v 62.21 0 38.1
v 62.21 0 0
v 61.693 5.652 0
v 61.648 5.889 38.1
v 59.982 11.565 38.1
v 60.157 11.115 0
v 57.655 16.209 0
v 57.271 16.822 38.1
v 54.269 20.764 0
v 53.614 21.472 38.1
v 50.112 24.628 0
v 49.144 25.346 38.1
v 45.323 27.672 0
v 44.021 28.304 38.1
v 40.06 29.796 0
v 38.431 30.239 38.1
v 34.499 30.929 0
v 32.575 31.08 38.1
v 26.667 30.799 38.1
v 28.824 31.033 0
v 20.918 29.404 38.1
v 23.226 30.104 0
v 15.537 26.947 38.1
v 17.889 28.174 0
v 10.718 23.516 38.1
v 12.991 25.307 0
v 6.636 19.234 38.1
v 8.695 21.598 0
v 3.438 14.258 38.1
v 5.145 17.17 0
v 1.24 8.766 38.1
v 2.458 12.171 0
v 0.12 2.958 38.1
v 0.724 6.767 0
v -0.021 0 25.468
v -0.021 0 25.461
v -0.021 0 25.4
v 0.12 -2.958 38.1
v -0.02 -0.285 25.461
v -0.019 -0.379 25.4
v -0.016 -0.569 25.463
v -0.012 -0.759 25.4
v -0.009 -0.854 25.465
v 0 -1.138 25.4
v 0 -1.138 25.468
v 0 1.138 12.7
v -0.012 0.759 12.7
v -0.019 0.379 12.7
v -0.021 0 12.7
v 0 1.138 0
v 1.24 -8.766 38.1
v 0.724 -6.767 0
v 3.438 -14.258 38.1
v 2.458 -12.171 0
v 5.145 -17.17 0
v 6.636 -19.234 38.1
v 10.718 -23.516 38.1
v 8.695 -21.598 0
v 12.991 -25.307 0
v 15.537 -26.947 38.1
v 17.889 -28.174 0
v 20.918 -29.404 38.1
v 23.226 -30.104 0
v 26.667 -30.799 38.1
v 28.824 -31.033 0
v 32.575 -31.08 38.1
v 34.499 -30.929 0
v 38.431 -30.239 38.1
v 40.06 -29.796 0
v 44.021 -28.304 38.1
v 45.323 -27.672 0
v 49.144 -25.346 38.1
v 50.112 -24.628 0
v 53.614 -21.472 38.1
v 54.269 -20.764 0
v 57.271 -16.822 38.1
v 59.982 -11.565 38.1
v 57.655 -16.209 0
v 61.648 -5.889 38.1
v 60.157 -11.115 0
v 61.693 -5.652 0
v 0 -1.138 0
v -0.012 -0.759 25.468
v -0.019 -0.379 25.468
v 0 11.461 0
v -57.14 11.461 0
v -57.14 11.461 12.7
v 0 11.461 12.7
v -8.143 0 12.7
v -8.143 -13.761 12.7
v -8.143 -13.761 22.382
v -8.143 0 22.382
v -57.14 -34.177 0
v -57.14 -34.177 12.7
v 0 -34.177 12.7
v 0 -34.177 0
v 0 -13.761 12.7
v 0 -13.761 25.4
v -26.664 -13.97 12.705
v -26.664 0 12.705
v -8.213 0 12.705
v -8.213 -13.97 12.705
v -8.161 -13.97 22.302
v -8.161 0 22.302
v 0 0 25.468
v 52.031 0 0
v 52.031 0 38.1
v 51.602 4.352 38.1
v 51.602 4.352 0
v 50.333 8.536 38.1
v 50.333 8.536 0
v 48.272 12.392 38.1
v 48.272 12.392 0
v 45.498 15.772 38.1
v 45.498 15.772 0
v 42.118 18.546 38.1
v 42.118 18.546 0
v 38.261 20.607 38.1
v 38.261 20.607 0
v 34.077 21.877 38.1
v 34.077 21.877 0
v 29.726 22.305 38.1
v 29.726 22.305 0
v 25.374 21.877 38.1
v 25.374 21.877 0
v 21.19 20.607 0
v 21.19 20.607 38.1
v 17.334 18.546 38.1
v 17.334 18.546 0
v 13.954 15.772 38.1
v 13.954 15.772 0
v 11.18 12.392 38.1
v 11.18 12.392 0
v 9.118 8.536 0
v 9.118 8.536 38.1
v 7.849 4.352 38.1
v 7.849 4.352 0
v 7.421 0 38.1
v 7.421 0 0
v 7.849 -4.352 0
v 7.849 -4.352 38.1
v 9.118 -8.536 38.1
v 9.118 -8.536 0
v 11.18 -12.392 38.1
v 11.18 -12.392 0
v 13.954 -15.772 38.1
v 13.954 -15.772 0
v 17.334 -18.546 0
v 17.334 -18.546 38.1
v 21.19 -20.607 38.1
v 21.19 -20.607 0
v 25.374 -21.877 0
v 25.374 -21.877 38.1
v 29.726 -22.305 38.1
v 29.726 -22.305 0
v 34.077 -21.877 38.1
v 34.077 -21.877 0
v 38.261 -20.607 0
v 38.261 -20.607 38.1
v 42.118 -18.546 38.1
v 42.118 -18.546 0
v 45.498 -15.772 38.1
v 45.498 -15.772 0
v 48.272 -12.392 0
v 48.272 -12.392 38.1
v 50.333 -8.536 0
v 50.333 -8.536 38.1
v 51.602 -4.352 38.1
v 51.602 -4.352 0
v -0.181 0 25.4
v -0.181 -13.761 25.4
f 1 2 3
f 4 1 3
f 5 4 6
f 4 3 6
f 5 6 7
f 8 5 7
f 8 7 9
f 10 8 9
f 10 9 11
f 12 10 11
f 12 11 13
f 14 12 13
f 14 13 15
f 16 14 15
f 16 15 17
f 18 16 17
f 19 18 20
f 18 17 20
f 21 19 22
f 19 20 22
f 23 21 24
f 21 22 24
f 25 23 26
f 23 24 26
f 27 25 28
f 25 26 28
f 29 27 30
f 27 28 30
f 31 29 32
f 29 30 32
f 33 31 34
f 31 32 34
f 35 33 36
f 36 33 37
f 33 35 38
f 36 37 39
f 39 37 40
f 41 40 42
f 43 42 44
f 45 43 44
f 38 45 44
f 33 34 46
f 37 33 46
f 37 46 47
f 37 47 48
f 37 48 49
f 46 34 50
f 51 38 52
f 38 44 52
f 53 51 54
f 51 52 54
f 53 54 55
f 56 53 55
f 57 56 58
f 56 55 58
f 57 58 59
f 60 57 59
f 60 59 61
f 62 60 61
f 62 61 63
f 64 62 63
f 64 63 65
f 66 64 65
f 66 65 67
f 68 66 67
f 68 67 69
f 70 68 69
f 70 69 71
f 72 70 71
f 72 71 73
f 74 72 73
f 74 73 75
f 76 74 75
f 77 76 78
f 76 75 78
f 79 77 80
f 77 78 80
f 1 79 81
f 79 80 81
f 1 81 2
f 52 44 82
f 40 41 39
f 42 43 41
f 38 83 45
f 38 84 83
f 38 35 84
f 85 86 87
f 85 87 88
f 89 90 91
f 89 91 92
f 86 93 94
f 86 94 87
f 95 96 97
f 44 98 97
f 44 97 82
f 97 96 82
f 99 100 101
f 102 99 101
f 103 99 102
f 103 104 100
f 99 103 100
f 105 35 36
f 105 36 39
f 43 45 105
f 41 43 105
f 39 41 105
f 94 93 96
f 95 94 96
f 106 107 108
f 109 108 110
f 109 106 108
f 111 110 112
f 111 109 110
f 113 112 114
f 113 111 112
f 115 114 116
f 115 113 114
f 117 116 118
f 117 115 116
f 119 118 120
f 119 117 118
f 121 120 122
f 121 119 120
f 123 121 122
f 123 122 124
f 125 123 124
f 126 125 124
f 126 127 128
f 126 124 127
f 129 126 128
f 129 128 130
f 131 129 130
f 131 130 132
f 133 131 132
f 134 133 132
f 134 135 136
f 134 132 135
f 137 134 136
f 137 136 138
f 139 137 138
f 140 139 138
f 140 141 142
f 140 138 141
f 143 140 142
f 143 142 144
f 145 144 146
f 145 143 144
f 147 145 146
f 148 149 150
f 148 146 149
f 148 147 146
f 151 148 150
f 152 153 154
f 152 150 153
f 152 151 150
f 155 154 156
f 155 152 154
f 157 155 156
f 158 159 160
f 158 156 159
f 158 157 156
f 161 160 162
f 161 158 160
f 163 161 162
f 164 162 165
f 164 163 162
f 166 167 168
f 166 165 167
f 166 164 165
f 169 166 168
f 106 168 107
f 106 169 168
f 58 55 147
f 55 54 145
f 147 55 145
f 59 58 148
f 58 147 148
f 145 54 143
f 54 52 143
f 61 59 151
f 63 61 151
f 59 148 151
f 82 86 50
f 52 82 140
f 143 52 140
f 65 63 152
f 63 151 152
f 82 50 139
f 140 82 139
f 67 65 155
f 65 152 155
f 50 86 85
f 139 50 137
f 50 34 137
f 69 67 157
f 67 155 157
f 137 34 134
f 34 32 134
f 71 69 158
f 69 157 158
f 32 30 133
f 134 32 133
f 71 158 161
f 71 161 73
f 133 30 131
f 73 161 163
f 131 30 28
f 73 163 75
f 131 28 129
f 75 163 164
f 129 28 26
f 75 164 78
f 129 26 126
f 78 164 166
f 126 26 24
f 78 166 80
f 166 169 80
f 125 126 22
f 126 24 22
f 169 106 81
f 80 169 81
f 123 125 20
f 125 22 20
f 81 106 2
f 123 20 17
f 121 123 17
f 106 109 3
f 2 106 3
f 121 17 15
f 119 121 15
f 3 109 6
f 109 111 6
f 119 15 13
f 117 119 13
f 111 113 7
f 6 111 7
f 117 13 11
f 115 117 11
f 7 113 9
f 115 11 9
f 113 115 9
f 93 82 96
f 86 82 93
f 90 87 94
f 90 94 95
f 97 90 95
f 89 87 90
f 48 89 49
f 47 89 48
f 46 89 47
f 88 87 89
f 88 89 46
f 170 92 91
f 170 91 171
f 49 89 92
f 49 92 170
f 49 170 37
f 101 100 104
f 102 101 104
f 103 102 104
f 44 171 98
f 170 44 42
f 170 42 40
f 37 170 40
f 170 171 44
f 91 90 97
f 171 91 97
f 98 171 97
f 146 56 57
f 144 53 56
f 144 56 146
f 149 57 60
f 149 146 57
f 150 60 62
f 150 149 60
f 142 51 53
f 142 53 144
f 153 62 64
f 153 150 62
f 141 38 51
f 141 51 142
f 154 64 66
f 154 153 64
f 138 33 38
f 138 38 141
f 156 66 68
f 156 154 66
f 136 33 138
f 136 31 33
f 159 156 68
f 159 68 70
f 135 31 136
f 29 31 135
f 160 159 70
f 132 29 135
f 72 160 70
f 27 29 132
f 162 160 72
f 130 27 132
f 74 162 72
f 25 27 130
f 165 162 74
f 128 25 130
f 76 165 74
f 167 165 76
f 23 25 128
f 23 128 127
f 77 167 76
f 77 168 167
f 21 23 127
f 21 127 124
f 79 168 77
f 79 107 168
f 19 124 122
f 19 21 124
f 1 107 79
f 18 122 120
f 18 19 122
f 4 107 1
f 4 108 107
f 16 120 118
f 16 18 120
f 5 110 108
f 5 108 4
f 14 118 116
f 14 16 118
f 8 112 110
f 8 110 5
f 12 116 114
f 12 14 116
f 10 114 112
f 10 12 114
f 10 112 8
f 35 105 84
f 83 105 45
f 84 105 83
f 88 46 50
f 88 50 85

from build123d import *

# Parameters (mm, degrees)
F0_W      = 57.1397617459
F0_H      = 45.6380844116
F1_DEPTH  = 12.7
F2_R      = 31.1156512476
F3_DEPTH  = 38.1
F4_R      = 22.305124326
F5_DEPTH  = 25.4
F6_DEPTH  = 25.4
F7_W      = 33.5428267717
F7_H      = 13.7611404061
F8_DEPTH  = 25.4
F10_DEPTH = 101.6
F11_DEPTH = 25.4
F12_DEPTH = 25.4
F13_DEPTH = 25.4
F14_DEPTH = 25.4
F15_DEPTH = 25.4
F17_DEPTH = 13.97


with BuildPart() as f1:
    # F0 (on Top) → F1 (new body)
    with BuildSketch(Plane.XY):
        with Locations((-28.569880873, -11.3582089543)):
            Rectangle(F0_W, F0_H)
    extrude(amount=F1_DEPTH)

    # F2 (on Top) → F3 (join)
    with BuildSketch(Plane.XY):
        with Locations((31.0948286206, 0)):
            Circle(F2_R)
    extrude(amount=F3_DEPTH)

    # F4 (on Top) → F5 (cut)
    with BuildSketch(Plane.XY):
        with Locations((29.7256410122, 0)):
            Circle(F4_R)
    extrude(amount=F5_DEPTH, mode=Mode.SUBTRACT)

    # F6 (cut): a face of the model
    f6_faces = [f1.faces().sort_by_distance(p)[0] for p in [
        (29.7256410122, 0, 25.4),
    ]]
    extrude(f6_faces, amount=-F6_DEPTH, mode=Mode.SUBTRACT)

    # F7 (on Top) → F8 (join)
    with BuildSketch(Plane.XY):
        with Locations((-16.7714133859, -6.8805702031)):
            Rectangle(F7_W, F7_H)
    extrude(amount=F8_DEPTH)

    # F9 (on Front) → F10 (join)
    with BuildSketch(Plane.XZ):
        Polygon((-33.4813073277, 25.4684705287), (-33.4813073277, 12.7780623734), (0, 25.4684705287), align=None)
    extrude(amount=F10_DEPTH)

    # F11 (cut): a face of the model
    f11_faces = [f1.faces().sort_by_distance(p)[0] for p in [
        (-22.3208715518, -101.6, 21.2383344769),
    ]]
    extrude(f11_faces, amount=-F11_DEPTH, mode=Mode.SUBTRACT)

    # F12 (cut): a face of the model
    f12_faces = [f1.faces().sort_by_distance(p)[0] for p in [
        (-22.3208715518, -76.2, 21.2383344769),
    ]]
    extrude(f12_faces, amount=-F12_DEPTH, mode=Mode.SUBTRACT)

    # F13 (cut): a face of the model
    f13_faces = [f1.faces().sort_by_distance(p)[0] for p in [
        (-22.3208715518, -50.8, 21.2383344769),
    ]]
    extrude(f13_faces, amount=-F13_DEPTH, mode=Mode.SUBTRACT)

    # F14 (cut): a face of the model
    f14_faces = [f1.faces().sort_by_distance(p)[0] for p in [
        (-22.3208715518, -25.4, 21.2383344769),
    ]]
    extrude(f14_faces, amount=-F14_DEPTH, mode=Mode.SUBTRACT)

    # F15 (cut): a face of the model
    f15_faces = [f1.faces().sort_by_distance(p)[0] for p in [
        (-33.5428267717, -6.8805702031, 19.05),
    ]]
    extrude(f15_faces, amount=-F15_DEPTH, mode=Mode.SUBTRACT)


with BuildPart() as f17:
    # F16 (on Front) → F17 (new body)
    with BuildSketch(Plane.XZ):
        Polygon((-8.2127032802, 12.7046965063), (-8.1610009074, 22.3023127764), (-26.6642346978, 12.7046965063), align=None)
    extrude(amount=F17_DEPTH)


solid = Compound([f1.part, f17.part])
